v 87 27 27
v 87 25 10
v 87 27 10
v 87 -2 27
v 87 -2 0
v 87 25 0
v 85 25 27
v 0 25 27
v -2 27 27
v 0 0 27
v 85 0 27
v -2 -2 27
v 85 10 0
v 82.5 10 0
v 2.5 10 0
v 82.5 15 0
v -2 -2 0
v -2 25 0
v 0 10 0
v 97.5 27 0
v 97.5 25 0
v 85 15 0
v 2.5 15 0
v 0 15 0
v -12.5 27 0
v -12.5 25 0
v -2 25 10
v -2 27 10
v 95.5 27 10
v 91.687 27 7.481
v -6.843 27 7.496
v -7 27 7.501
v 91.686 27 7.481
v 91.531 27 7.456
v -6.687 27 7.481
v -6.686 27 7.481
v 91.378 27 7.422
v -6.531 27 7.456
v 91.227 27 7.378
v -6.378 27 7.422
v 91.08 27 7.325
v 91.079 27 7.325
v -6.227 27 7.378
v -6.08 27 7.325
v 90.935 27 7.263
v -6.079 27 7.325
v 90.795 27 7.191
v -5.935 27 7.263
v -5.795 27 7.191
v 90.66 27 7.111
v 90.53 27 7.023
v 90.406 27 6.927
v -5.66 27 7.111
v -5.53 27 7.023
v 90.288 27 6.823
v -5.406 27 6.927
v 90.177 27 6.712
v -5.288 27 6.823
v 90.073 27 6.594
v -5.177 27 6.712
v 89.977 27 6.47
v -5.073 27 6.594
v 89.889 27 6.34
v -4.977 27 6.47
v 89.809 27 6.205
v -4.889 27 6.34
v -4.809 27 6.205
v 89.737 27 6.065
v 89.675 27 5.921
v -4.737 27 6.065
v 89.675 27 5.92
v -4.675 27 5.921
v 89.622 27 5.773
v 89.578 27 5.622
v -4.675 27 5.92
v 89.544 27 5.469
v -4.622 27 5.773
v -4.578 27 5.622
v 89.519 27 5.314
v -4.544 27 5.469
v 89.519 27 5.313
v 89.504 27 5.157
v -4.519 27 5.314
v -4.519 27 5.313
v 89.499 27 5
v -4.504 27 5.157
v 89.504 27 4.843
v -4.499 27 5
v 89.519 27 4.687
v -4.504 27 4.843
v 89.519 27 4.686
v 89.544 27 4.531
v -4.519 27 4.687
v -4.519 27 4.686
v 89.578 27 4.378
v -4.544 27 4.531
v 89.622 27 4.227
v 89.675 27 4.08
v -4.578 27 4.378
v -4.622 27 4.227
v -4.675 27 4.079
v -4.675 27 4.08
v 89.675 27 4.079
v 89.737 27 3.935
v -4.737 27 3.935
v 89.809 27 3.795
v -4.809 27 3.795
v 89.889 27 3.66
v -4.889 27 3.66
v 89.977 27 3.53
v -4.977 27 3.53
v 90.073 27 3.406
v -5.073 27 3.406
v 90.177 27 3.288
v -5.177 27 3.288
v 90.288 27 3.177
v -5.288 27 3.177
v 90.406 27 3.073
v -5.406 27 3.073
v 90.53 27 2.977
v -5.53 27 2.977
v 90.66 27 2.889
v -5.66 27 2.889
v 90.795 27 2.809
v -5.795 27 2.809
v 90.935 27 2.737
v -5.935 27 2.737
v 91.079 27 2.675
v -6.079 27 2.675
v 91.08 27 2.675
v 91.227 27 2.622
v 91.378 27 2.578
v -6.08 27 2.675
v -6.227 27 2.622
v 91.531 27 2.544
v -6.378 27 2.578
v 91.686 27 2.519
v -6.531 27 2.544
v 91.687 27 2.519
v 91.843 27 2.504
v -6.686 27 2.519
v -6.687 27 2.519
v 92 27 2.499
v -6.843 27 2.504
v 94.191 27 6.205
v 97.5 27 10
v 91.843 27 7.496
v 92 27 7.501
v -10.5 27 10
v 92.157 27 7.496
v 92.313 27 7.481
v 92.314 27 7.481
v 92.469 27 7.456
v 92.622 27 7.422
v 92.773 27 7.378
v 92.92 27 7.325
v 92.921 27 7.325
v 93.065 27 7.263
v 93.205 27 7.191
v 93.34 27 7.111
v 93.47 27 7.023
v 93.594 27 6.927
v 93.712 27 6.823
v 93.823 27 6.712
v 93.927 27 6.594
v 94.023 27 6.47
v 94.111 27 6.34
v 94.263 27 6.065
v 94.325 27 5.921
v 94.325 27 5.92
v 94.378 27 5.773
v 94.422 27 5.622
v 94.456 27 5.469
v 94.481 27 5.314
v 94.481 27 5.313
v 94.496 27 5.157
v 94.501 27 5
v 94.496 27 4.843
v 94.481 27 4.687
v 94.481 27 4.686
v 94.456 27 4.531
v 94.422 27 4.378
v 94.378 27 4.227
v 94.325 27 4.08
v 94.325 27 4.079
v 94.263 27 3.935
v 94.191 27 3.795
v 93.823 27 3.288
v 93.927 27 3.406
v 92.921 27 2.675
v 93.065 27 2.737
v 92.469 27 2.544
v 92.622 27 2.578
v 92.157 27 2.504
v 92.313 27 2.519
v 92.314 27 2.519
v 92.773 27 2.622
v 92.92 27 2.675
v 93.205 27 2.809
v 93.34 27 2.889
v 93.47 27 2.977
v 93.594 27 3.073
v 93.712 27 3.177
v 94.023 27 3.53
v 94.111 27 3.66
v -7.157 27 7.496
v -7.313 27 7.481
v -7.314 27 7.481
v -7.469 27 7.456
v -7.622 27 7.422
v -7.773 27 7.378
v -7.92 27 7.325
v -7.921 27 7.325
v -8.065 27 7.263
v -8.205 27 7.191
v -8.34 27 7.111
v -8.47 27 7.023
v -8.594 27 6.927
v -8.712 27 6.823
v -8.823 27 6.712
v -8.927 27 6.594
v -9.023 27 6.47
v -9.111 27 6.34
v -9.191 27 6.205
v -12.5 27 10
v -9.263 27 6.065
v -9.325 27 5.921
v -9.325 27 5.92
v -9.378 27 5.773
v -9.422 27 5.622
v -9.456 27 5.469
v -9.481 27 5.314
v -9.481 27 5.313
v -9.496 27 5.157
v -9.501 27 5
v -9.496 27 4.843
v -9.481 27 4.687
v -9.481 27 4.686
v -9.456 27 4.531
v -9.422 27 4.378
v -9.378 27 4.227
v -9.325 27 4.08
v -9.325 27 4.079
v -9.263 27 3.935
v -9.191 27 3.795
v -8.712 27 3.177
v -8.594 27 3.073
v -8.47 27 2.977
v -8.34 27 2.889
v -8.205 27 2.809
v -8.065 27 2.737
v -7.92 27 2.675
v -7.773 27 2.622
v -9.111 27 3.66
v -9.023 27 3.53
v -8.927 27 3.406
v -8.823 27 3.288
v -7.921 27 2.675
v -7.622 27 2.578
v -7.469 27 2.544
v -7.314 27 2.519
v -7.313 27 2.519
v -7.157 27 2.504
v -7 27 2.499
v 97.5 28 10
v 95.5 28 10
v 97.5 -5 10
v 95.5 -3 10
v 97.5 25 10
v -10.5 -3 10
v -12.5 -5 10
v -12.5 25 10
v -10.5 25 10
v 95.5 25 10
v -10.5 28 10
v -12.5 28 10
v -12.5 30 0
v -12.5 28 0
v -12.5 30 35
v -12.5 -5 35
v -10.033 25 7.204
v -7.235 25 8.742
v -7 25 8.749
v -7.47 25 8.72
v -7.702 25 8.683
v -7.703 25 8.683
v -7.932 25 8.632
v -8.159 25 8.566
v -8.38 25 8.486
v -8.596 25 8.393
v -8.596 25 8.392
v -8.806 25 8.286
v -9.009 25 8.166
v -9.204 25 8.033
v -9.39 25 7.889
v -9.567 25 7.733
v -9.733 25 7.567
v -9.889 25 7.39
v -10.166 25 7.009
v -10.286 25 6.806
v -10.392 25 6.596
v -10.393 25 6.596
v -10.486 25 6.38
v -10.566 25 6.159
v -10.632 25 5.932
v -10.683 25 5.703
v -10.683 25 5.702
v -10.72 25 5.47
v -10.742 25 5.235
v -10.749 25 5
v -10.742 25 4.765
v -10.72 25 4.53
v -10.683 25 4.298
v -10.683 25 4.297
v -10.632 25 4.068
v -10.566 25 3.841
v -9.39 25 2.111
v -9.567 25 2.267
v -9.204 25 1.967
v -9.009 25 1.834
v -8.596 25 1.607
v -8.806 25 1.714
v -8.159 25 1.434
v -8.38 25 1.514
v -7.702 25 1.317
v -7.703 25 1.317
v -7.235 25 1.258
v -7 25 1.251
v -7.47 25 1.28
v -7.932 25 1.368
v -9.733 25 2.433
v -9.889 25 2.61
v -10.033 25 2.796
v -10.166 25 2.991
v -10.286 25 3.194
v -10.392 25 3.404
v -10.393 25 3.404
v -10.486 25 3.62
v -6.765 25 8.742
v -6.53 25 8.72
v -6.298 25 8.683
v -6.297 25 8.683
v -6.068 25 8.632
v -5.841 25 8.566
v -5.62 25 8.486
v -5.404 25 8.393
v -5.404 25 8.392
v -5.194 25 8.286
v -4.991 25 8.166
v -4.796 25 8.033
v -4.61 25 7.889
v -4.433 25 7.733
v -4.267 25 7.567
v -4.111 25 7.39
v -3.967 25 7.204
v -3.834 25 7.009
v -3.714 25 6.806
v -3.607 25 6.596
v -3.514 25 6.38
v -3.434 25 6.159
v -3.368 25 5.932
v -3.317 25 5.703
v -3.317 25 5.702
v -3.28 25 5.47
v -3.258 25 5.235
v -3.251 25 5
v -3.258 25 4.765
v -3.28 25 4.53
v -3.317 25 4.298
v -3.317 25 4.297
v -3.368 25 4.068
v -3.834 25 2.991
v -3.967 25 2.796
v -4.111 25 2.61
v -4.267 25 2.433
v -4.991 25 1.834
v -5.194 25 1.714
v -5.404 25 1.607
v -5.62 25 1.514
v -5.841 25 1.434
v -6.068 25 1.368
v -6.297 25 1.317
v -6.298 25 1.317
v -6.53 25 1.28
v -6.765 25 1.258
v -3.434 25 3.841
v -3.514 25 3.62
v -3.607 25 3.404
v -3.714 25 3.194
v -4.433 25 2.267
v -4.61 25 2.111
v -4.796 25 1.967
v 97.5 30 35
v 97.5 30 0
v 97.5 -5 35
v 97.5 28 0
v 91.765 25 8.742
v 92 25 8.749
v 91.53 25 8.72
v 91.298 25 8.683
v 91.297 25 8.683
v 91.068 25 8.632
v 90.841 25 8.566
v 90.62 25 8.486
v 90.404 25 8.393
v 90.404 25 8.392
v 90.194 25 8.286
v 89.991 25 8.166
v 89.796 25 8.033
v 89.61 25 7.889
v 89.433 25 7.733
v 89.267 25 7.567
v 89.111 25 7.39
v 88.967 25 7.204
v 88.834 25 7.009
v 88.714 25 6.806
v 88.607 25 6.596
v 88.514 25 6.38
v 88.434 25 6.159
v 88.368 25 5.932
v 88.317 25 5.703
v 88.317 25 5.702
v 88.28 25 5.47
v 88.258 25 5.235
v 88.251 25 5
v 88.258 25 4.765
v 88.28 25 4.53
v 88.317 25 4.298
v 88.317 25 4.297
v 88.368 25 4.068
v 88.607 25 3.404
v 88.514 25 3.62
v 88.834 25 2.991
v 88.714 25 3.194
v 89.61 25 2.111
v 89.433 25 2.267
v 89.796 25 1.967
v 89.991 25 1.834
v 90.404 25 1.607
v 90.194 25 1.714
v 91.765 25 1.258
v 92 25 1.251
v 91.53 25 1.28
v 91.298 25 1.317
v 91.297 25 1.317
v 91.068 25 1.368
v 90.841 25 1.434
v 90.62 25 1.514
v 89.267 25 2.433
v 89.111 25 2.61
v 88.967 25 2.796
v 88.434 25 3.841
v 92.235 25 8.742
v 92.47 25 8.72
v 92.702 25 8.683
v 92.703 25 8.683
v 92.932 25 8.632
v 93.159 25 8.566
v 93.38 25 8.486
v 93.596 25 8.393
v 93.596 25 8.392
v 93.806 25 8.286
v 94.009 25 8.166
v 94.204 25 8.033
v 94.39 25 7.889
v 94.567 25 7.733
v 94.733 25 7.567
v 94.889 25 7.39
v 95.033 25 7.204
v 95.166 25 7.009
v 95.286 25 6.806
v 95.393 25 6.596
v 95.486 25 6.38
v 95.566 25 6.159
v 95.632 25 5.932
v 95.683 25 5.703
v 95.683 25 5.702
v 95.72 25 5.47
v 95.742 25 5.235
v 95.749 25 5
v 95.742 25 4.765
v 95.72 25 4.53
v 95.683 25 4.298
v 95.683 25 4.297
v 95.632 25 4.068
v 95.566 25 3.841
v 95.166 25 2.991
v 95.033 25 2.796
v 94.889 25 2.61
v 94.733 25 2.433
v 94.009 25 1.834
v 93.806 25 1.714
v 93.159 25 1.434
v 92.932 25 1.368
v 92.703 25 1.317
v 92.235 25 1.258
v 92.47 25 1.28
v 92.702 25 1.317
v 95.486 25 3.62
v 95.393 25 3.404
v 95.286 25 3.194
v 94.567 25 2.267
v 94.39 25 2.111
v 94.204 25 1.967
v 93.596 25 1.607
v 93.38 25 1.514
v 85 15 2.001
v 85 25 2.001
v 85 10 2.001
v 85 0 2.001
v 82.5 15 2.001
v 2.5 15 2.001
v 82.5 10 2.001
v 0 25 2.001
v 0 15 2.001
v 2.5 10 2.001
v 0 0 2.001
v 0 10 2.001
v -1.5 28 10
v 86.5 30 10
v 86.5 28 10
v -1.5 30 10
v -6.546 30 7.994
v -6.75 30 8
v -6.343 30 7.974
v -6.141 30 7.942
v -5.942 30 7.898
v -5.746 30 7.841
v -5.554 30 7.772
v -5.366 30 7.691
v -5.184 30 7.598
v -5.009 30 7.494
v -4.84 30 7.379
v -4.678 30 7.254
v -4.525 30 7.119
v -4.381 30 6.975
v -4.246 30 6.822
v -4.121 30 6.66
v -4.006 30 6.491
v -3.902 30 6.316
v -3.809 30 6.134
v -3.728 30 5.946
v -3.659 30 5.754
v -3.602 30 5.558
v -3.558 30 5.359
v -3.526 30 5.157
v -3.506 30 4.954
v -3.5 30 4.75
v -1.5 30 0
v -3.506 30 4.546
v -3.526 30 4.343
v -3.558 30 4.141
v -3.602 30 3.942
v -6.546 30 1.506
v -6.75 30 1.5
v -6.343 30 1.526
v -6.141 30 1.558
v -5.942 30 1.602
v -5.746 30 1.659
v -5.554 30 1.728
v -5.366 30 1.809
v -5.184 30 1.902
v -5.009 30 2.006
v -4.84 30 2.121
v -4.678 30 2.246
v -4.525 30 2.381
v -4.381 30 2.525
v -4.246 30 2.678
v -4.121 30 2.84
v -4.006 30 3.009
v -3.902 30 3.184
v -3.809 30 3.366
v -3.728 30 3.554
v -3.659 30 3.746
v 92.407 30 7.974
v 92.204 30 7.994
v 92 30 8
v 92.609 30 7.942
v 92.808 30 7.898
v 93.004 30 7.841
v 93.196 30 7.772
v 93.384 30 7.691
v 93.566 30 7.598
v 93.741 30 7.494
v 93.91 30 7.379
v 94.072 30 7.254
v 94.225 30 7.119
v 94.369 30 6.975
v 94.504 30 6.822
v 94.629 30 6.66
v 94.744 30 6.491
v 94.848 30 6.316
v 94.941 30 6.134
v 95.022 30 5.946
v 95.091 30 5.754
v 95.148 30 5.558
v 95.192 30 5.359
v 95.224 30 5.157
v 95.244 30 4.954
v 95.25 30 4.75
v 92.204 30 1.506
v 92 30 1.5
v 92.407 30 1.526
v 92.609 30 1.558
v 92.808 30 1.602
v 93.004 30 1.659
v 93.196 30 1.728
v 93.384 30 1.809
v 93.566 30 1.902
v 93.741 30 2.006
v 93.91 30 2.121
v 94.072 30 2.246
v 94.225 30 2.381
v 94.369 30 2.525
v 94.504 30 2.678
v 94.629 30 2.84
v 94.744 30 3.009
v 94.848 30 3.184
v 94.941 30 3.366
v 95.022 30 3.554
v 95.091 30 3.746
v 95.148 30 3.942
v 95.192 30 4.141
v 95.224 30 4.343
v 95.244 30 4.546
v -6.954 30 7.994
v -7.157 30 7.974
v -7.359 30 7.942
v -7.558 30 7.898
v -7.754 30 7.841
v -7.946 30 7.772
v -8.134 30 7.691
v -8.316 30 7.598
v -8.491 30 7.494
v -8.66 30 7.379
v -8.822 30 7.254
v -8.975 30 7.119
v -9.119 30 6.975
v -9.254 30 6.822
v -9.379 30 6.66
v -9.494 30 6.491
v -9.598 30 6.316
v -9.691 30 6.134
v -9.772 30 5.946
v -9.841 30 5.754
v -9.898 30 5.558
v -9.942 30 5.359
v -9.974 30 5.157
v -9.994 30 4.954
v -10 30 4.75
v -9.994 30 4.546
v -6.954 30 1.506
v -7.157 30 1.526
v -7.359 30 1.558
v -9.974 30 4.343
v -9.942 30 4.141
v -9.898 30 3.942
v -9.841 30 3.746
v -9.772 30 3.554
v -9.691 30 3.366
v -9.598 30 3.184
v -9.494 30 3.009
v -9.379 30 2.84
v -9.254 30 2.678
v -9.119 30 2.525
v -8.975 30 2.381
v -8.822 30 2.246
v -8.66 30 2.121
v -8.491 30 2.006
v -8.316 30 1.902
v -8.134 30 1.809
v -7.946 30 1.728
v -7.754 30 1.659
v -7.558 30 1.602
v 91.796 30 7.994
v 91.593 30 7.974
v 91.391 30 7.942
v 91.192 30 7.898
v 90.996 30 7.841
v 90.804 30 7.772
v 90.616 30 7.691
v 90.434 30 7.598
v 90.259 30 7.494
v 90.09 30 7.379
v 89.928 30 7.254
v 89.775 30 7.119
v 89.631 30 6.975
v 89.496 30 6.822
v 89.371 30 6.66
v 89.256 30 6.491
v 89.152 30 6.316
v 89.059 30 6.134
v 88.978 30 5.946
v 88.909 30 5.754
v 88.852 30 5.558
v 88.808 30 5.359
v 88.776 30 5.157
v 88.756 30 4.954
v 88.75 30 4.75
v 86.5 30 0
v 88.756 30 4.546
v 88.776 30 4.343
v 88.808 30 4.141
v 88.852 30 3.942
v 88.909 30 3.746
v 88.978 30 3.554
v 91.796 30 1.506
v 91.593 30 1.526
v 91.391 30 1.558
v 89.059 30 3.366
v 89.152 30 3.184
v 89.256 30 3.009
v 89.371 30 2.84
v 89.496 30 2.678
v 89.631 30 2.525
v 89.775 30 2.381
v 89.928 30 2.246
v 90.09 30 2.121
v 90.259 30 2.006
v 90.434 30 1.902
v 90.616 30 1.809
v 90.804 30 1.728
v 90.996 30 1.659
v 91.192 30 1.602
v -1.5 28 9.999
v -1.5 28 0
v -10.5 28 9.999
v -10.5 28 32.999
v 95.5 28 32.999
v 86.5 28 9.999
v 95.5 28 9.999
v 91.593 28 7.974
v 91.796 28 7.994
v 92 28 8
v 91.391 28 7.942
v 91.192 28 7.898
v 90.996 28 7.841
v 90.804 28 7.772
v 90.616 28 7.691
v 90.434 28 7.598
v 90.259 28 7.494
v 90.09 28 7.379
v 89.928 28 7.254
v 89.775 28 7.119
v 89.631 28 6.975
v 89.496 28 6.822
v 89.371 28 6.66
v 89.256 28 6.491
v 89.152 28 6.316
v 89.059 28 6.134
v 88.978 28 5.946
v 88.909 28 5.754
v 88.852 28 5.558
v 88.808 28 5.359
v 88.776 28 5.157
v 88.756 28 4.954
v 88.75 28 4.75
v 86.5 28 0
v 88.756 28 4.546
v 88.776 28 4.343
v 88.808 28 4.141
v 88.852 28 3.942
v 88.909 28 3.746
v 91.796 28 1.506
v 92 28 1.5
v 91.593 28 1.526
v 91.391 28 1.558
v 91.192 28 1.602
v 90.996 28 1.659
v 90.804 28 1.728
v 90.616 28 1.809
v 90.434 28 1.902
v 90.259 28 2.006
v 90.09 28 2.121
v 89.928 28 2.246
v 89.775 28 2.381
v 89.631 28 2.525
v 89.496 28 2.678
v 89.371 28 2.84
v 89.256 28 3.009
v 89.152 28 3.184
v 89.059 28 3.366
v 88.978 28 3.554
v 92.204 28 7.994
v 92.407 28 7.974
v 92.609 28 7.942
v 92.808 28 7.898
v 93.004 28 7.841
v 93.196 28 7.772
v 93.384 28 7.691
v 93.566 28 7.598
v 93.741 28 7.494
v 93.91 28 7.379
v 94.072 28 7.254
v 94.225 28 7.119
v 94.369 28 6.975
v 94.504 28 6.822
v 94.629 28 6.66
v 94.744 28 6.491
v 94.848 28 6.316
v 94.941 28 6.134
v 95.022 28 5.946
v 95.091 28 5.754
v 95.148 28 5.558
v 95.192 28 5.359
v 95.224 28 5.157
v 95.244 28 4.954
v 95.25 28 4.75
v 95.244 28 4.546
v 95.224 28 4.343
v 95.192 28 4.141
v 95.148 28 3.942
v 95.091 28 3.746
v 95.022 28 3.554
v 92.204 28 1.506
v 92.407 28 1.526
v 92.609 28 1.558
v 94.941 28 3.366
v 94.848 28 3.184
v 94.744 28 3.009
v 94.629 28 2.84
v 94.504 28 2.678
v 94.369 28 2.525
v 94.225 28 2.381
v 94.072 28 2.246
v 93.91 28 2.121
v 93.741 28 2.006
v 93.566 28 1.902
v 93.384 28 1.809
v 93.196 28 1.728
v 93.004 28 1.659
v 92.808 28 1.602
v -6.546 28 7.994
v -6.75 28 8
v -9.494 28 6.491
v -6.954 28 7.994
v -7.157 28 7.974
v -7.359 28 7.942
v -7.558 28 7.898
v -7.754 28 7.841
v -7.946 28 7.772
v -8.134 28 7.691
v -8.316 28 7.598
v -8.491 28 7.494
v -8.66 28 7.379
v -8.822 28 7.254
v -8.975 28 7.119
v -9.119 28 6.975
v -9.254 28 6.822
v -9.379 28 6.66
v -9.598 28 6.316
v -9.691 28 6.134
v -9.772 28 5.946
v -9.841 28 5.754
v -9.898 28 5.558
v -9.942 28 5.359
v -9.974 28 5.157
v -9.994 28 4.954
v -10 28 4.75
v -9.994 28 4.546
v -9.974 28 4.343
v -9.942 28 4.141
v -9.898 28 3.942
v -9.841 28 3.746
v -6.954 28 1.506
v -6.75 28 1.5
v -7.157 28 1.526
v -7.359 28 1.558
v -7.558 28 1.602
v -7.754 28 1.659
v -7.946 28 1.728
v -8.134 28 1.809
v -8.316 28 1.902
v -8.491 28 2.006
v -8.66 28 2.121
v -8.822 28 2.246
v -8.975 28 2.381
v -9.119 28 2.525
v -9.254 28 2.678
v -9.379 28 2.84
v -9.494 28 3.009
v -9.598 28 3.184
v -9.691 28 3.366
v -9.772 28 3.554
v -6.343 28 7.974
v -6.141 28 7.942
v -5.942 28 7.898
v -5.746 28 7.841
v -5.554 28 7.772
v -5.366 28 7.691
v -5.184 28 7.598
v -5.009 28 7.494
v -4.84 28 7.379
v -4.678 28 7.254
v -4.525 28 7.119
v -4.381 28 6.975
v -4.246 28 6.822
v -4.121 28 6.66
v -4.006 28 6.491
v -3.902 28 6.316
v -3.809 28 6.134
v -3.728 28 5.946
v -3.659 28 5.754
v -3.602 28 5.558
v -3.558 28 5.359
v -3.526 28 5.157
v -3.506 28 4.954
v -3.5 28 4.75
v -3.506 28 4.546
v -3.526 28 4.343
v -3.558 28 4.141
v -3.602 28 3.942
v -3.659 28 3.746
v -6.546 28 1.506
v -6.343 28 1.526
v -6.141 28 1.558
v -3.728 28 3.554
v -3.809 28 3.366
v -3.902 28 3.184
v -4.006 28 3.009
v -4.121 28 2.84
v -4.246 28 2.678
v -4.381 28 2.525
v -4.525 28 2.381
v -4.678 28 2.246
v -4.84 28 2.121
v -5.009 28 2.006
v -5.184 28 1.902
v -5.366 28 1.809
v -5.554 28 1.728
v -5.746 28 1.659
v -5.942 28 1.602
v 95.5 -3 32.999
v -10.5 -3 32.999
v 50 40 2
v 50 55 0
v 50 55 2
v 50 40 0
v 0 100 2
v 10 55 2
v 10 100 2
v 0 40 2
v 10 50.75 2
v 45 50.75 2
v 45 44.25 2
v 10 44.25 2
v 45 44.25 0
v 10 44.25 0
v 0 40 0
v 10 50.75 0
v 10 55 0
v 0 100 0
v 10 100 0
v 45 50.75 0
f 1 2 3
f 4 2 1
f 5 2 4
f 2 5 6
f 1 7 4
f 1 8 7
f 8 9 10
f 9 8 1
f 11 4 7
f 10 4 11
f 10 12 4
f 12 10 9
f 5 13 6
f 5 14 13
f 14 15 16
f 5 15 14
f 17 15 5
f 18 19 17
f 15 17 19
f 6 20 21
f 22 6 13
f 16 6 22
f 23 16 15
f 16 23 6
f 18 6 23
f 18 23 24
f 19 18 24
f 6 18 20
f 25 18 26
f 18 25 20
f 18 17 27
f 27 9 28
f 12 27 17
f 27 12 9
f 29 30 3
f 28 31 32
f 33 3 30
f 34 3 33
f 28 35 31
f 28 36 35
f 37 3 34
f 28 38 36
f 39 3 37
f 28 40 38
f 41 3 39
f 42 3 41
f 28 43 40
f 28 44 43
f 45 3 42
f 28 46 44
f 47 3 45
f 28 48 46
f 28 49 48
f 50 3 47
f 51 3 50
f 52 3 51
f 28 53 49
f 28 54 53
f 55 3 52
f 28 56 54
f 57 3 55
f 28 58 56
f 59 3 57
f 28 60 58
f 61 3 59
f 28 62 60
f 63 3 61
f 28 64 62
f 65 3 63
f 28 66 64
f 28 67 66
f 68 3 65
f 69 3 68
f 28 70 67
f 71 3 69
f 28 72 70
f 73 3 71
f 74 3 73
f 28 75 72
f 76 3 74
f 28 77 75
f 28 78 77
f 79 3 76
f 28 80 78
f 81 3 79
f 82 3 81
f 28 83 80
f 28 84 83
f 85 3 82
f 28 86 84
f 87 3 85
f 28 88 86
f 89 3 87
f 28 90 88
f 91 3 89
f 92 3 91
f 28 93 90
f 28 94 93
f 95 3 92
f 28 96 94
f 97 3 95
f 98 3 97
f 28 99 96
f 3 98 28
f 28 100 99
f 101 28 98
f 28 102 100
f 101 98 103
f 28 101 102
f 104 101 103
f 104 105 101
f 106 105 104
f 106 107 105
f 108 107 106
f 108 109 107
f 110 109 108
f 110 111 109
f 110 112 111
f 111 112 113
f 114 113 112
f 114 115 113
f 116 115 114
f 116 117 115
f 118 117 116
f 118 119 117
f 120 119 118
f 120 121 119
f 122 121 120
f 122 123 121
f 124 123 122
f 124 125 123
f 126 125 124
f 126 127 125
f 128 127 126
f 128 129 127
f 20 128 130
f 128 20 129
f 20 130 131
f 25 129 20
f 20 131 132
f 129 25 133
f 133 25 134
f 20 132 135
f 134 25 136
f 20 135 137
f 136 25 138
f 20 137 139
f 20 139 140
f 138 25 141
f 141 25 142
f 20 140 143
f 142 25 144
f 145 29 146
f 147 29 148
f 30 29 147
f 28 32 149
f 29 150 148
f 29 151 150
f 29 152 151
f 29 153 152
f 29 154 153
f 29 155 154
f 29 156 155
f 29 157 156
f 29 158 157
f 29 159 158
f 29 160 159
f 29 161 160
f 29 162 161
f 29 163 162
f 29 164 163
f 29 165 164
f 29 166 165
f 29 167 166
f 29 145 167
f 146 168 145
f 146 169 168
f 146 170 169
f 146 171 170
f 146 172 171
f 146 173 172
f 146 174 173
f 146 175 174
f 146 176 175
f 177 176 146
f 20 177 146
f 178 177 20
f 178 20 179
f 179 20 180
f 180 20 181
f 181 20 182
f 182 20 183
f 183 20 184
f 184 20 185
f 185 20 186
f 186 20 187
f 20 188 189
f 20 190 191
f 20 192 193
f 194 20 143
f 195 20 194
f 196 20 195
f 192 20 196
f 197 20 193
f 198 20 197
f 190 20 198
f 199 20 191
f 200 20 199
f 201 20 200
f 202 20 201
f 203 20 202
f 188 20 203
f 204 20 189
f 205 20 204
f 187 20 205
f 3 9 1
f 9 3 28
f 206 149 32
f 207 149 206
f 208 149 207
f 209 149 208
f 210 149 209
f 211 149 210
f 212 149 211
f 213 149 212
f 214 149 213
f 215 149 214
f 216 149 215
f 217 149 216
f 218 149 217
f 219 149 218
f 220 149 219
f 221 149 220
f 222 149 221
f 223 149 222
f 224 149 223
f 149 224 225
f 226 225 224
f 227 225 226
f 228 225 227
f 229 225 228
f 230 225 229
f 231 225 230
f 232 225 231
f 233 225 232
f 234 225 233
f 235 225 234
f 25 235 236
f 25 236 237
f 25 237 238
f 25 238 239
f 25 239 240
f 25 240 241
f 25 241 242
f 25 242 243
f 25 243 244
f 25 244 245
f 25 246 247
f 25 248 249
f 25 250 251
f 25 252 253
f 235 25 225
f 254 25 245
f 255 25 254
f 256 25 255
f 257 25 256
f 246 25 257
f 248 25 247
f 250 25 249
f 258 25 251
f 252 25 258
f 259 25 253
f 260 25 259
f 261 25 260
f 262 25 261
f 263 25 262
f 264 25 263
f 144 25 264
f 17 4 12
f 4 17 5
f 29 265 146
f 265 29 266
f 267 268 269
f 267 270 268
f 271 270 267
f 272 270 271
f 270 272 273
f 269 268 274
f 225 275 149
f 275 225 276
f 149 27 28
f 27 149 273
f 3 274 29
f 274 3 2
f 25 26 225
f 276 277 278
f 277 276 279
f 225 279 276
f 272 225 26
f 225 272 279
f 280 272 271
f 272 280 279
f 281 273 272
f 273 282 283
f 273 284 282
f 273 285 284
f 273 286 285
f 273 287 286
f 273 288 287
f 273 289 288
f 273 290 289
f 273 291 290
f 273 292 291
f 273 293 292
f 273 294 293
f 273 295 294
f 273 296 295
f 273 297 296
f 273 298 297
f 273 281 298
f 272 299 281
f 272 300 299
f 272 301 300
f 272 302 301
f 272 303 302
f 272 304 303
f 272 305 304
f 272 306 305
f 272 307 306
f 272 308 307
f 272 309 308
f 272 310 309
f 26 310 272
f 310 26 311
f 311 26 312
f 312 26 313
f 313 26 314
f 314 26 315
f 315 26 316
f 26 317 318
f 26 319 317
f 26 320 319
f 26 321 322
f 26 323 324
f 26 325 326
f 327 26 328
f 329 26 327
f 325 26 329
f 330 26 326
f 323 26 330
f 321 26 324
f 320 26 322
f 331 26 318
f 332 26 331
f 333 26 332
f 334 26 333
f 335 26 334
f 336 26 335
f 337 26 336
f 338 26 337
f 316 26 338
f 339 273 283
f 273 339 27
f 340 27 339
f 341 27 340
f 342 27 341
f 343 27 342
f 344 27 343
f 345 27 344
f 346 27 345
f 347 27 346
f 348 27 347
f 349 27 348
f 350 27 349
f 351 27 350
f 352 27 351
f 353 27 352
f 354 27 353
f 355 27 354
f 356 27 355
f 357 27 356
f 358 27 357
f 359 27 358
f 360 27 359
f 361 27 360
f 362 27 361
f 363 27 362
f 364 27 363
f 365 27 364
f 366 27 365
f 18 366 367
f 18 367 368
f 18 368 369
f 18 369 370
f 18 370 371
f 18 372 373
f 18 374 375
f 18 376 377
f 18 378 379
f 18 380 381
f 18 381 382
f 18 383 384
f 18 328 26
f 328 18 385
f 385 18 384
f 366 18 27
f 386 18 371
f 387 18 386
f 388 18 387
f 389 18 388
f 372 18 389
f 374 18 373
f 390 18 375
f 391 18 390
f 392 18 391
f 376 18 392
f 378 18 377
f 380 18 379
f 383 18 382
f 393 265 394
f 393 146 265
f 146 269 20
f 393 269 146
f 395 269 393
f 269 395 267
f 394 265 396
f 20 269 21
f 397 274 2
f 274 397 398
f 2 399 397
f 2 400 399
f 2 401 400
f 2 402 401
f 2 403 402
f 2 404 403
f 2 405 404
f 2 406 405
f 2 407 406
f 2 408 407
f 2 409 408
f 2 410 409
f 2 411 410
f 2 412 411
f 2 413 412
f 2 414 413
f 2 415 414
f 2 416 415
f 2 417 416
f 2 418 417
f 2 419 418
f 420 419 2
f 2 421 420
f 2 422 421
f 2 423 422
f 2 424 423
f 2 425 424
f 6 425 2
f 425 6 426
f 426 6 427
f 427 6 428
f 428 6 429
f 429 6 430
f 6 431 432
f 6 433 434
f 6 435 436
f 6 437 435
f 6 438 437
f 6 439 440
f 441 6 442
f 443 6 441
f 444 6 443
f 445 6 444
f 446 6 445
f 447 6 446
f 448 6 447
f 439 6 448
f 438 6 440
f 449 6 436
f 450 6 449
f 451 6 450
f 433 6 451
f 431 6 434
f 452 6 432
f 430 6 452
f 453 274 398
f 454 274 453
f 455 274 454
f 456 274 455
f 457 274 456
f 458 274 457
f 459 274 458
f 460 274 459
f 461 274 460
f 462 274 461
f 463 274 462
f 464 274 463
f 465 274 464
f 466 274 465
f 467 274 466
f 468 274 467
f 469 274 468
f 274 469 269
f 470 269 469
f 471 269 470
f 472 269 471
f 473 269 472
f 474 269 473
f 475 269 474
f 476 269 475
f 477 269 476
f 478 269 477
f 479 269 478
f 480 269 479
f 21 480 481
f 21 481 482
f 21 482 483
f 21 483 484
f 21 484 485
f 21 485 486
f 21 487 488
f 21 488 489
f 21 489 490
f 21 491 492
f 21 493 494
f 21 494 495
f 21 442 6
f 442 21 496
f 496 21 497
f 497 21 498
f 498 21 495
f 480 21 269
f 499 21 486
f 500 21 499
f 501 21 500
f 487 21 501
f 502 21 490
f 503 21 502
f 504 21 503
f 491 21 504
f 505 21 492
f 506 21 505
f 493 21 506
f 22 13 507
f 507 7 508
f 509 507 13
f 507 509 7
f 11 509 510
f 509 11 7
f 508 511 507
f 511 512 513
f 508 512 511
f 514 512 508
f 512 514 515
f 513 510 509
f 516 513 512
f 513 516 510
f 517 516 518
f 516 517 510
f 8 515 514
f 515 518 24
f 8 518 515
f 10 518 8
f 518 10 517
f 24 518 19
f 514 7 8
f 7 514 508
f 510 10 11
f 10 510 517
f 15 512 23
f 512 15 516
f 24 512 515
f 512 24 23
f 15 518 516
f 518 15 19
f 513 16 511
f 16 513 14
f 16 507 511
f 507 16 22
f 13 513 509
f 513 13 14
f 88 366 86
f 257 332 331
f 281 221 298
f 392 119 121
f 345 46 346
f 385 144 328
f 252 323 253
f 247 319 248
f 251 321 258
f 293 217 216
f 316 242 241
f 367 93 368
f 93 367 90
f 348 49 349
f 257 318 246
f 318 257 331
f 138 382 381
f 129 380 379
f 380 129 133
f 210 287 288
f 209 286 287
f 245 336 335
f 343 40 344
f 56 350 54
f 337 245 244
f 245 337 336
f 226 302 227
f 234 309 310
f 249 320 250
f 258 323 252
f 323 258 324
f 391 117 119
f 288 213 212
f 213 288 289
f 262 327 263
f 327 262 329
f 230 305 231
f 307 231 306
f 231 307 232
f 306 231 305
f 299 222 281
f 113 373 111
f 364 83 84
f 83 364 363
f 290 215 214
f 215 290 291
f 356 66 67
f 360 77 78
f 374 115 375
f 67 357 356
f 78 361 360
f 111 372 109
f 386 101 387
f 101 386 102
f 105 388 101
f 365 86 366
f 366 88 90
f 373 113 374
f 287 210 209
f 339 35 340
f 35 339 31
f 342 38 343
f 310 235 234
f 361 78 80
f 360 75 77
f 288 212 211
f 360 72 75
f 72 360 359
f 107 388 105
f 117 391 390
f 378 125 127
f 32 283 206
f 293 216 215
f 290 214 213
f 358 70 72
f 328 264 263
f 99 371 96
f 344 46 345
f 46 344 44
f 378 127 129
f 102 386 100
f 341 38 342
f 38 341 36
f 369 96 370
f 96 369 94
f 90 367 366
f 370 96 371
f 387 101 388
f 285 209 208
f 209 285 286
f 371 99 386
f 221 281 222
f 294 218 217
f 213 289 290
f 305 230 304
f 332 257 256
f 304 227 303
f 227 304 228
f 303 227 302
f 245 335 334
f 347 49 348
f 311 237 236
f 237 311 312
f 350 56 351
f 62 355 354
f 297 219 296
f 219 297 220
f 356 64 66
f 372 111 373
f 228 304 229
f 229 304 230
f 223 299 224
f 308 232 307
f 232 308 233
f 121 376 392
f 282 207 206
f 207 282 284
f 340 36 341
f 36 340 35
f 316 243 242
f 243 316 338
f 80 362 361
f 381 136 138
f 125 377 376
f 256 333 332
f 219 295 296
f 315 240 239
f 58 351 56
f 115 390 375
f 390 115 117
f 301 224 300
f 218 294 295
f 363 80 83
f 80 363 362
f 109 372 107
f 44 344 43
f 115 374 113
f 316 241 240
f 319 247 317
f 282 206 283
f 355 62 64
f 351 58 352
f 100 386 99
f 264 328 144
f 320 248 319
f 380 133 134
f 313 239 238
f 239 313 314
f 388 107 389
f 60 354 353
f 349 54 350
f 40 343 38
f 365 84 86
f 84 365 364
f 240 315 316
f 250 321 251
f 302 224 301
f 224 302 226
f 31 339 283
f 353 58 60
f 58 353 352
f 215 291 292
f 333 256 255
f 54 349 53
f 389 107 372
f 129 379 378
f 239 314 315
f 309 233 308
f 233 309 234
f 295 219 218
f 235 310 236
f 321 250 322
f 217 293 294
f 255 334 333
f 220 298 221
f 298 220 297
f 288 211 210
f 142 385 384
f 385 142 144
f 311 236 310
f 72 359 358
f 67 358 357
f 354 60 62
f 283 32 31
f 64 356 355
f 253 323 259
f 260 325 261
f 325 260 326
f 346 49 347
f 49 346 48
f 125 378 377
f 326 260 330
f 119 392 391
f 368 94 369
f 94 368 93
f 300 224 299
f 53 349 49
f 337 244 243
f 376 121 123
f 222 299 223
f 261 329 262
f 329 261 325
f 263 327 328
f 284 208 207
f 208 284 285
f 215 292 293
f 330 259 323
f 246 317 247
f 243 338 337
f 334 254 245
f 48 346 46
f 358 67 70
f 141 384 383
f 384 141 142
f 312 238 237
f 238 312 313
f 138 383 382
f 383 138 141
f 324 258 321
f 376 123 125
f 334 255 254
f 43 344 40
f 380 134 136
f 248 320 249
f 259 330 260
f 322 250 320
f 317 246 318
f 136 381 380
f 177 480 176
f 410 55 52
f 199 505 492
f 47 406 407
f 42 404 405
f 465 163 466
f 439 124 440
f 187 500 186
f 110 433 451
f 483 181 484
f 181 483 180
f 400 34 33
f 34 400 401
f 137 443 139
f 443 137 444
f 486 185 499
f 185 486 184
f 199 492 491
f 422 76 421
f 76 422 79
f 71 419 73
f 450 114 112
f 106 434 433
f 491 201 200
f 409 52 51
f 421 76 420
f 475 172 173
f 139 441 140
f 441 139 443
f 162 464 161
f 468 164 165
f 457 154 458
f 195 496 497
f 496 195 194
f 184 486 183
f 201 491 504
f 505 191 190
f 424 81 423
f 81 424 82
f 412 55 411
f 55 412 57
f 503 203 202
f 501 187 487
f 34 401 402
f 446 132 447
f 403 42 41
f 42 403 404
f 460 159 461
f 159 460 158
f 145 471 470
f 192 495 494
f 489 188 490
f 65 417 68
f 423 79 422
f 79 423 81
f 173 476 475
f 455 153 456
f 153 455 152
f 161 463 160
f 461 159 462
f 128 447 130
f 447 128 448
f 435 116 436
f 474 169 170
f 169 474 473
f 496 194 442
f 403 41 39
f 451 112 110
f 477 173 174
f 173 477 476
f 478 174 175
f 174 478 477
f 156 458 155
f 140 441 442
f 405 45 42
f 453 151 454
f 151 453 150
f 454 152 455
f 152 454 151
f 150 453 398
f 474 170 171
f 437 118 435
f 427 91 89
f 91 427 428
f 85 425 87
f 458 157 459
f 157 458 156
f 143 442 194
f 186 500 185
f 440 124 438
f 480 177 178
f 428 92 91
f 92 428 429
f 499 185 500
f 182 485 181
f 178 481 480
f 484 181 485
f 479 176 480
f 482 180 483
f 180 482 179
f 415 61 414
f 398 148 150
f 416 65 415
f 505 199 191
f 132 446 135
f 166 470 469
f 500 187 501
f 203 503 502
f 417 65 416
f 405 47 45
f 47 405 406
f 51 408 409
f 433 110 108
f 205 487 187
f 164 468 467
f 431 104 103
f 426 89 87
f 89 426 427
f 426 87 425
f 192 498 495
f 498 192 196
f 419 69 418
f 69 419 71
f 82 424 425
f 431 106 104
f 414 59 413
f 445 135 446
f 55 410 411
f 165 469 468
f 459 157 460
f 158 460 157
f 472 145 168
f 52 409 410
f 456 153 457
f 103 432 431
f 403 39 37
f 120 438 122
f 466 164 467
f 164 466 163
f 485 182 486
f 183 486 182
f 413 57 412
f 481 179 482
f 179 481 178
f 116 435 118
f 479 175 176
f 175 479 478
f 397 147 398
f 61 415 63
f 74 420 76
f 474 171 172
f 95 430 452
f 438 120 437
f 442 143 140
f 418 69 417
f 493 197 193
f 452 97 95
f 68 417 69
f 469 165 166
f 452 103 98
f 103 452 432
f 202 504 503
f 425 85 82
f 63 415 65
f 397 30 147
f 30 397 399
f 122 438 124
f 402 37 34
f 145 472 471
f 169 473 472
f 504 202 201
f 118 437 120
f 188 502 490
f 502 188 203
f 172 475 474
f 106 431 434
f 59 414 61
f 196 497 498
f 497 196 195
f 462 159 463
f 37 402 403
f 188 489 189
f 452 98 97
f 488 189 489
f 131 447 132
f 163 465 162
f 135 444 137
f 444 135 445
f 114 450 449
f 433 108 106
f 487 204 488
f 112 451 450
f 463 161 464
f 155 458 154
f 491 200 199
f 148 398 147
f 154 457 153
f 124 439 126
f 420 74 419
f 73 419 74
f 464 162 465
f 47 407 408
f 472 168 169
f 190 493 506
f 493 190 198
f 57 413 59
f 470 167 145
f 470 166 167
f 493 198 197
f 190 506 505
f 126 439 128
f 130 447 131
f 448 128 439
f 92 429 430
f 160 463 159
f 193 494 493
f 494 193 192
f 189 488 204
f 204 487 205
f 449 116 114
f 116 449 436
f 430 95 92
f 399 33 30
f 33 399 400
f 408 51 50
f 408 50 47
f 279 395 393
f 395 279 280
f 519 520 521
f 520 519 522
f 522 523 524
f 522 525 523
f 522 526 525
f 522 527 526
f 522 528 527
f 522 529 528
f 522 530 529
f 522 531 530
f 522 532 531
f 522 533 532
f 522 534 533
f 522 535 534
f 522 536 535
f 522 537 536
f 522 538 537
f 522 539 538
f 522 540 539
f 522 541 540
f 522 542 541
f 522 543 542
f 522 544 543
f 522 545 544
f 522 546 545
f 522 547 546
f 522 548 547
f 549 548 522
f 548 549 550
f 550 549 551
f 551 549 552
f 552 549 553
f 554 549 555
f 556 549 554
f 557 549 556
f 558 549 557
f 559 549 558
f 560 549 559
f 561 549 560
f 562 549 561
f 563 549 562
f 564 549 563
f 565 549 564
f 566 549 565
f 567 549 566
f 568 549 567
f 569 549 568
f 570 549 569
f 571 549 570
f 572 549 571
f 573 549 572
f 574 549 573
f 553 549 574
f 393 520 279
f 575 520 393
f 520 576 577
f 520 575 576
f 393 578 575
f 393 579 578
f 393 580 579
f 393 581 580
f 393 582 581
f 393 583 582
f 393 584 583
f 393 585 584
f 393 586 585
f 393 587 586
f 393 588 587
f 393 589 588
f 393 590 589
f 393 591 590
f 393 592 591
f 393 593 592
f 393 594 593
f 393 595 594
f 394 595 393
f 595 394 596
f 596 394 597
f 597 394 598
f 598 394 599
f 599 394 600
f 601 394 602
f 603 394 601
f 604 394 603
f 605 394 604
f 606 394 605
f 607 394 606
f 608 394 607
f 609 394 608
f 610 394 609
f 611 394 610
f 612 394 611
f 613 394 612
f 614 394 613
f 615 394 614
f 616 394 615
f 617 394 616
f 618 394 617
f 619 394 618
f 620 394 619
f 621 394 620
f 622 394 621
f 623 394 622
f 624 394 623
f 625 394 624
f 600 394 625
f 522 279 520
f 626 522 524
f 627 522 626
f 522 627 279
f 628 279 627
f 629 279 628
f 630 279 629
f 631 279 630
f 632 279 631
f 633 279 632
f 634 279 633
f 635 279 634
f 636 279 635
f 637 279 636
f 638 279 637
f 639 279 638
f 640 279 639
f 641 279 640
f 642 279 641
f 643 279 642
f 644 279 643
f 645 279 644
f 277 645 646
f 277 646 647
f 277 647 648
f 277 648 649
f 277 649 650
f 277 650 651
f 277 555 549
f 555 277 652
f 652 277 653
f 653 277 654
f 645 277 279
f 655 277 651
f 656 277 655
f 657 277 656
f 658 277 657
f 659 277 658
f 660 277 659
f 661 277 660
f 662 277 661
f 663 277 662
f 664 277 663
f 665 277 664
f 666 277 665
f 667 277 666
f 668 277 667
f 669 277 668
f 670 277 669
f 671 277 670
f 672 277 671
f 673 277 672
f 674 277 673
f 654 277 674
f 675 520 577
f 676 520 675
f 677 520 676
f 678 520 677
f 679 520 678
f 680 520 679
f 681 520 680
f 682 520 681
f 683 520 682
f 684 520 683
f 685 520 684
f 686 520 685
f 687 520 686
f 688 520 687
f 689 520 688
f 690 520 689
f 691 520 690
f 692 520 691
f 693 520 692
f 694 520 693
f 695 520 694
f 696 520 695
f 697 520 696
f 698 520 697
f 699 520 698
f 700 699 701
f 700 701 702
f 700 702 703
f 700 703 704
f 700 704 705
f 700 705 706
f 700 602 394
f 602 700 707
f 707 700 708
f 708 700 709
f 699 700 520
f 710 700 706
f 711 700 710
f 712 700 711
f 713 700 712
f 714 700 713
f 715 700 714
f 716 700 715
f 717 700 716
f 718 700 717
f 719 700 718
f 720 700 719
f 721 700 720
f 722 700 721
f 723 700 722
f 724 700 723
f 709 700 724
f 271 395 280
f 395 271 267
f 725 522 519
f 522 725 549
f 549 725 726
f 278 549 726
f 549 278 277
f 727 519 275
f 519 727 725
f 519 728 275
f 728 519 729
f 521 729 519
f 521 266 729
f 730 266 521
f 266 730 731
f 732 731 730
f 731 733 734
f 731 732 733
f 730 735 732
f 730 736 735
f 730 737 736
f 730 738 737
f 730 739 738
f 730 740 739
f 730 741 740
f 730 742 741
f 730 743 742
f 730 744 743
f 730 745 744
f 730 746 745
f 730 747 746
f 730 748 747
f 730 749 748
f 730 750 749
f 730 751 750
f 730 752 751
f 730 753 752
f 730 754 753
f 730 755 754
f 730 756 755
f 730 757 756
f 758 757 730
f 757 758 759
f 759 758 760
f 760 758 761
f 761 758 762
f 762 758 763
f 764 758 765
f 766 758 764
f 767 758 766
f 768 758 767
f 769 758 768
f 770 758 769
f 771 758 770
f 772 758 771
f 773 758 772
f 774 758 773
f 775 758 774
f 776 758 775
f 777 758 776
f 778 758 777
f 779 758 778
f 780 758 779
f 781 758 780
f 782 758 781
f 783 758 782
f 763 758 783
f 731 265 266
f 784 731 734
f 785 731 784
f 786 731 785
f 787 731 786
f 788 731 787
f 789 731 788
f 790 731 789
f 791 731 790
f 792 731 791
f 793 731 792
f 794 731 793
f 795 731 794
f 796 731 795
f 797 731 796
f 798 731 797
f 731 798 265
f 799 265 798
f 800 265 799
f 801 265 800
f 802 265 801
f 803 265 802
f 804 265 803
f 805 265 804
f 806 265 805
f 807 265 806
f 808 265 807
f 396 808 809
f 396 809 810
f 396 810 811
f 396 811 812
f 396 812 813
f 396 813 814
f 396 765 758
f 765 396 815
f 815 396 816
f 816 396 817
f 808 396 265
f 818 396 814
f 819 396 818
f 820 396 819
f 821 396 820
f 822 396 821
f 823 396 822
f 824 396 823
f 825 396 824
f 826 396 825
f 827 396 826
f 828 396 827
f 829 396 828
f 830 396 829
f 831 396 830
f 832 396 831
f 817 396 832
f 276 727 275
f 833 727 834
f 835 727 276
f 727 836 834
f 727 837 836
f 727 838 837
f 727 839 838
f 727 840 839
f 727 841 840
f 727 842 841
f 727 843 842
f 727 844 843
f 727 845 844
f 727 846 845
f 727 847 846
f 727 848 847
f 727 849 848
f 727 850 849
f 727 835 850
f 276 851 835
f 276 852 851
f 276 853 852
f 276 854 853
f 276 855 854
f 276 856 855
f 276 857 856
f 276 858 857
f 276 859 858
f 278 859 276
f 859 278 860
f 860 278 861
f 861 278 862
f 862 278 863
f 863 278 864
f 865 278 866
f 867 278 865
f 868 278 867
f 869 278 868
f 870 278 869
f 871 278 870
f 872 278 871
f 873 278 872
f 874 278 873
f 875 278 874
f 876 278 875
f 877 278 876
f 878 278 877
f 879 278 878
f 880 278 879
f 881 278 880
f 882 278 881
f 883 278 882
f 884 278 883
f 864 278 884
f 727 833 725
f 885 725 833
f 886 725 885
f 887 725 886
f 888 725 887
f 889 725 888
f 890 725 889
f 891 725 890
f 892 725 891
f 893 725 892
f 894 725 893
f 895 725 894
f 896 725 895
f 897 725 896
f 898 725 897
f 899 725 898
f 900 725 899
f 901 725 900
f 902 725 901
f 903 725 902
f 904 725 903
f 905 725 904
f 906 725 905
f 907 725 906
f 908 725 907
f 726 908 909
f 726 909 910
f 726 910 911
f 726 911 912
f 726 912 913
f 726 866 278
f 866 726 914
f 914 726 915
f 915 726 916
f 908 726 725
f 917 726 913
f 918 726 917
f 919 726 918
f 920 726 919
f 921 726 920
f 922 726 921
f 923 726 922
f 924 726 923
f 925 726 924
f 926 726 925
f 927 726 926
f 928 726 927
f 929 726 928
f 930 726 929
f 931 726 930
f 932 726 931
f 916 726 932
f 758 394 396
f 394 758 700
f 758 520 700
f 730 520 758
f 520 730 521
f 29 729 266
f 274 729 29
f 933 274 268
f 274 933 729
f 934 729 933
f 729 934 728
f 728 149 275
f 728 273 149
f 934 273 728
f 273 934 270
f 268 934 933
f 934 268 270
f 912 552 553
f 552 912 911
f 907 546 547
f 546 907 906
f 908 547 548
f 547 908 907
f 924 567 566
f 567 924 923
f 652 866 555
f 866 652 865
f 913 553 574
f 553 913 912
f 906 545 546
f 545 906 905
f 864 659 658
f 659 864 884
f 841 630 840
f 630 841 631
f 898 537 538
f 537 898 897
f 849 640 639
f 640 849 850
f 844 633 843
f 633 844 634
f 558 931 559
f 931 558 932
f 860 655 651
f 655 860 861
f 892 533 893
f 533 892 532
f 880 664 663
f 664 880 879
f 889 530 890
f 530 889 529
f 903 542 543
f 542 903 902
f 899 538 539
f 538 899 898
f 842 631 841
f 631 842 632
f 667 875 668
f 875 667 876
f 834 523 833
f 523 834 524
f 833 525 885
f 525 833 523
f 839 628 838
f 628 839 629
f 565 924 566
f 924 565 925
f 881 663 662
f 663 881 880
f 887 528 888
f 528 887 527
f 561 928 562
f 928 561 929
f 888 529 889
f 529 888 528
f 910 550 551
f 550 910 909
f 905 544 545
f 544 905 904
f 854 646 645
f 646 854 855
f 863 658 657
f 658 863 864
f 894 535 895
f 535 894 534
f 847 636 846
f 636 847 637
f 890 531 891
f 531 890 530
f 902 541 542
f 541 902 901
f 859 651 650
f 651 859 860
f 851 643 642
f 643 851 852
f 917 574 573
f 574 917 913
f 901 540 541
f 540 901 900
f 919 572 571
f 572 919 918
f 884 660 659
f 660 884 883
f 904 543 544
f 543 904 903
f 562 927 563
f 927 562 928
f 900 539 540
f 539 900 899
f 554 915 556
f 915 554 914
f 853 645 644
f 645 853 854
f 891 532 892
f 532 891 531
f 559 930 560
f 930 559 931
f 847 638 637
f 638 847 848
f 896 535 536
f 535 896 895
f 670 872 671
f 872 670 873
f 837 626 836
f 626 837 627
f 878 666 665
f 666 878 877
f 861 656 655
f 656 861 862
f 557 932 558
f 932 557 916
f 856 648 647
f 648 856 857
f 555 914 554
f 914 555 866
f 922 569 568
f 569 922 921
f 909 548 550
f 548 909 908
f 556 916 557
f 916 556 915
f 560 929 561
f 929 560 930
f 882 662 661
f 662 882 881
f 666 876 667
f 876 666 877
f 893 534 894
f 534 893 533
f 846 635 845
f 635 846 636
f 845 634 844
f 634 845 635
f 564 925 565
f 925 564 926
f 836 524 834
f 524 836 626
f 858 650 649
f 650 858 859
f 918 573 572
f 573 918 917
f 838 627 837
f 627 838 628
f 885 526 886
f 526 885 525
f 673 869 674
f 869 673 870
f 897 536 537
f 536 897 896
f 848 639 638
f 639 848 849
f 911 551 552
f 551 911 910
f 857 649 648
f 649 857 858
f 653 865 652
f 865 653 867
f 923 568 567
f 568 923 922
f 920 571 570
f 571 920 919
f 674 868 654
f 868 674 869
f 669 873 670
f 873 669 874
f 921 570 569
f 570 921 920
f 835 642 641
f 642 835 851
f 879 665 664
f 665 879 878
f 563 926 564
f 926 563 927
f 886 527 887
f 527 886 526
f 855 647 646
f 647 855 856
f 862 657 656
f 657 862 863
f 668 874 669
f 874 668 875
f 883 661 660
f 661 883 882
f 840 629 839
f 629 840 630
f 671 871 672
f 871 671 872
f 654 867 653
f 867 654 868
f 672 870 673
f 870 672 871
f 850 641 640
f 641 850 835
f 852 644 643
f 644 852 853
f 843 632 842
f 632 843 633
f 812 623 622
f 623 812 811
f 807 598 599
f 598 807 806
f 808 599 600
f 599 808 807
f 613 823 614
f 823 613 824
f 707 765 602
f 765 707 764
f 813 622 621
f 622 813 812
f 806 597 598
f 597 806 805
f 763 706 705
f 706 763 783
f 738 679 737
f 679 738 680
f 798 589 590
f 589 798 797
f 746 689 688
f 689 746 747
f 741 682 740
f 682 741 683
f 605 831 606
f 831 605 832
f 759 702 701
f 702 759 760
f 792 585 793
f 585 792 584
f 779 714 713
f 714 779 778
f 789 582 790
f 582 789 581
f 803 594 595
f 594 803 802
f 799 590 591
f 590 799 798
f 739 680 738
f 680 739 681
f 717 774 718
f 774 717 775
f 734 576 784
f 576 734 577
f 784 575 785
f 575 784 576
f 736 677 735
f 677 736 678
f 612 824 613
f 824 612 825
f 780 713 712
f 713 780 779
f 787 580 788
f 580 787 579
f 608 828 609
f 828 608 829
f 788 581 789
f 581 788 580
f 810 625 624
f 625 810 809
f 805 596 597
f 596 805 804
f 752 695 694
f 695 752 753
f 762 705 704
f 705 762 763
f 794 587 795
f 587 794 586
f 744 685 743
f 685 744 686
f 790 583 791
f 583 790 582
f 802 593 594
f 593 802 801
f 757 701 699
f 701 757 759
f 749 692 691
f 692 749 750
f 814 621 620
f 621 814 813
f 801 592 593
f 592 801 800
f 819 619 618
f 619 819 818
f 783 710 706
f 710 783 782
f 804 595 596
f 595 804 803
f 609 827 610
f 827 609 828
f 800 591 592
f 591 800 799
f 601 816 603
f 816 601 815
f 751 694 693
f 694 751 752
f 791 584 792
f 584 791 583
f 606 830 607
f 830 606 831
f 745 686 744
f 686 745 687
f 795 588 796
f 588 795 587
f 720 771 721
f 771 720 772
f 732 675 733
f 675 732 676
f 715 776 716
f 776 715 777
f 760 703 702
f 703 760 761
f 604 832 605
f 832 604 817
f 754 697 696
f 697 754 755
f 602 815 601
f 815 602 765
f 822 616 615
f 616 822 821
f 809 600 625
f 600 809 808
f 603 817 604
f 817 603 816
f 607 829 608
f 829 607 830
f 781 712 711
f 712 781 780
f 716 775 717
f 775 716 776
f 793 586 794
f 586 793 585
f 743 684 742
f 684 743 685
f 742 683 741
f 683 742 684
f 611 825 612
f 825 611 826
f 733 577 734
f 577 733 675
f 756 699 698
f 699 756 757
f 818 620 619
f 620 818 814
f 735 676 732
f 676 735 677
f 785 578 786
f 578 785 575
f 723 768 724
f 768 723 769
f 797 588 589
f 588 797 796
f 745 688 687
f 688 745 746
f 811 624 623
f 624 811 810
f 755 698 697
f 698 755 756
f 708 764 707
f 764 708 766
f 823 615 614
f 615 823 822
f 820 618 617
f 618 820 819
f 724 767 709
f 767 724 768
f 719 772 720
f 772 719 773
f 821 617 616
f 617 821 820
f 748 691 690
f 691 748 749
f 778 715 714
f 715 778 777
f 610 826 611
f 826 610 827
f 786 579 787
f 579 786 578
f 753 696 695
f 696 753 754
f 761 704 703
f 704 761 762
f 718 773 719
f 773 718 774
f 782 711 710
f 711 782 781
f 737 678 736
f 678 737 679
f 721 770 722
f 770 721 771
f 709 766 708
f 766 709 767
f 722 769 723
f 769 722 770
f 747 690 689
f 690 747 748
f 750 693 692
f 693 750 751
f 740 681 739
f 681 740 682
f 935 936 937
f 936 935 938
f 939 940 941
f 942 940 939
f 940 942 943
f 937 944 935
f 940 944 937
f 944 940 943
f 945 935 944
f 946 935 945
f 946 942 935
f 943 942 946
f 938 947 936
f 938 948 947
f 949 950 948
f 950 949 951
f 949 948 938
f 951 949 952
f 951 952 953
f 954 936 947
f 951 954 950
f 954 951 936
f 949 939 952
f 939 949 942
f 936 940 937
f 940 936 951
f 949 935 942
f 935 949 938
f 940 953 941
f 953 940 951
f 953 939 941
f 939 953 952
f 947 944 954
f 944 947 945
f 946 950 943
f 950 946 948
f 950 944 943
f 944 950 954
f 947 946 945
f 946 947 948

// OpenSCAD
//
// ktBOX5
//
//


gap1 = 0.001;
gap2 = 0.002;

panel_thick = 2;

X = 85;
Y = 25;
Z = 25;

X2 = 100+(panel_thick+1)*2;
Y2 = 25+(panel_thick+1)*2;
Z2 = 20+panel_thick+1;

DX = (X2-X)/2;
DY = (Y2-Y)/2;
DZ = (Z2-Z)/2;

translate([0, 0, 0]) A();
translate([-DX, -DY, 10]) B();
translate([0, 40, 0]) C();

module A()
{
difference()
{
    union()
    {
        translate([-panel_thick, -panel_thick, 0]) cube([X+panel_thick*2, Y+panel_thick*2, Z+panel_thick]);
        translate([-12.5, Y, 0]) cube([11, panel_thick, 10]);
        translate([X+1.5, Y, 0]) cube([11, panel_thick, 10]);
    }
    translate([0, 0, panel_thick+gap1]) cube([X, Y, Z]);
    translate([0, Y/2-2.5, -2.5]) cube([2.5, 5, 10]);
    translate([X-2.5, Y/2-2.5, -2.5]) cube([2.5, 5, 10]);
    translate([-7, Y+panel_thick+gap1, 5]) rotate([90, 0, 0]) cylinder( panel_thick+gap2, d1=5, d2=7.5, $fn=100);
    translate([X+7, Y+panel_thick+gap1, 5]) rotate([90, 0, 0]) cylinder( panel_thick+gap2, d1=5, d2=7.5, $fn=100);
}
}

module B()
{
difference()
{
    union()
    {
        translate([-panel_thick, -panel_thick, 0]) cube([X2+panel_thick*2, Y2+panel_thick*2, Z2+panel_thick]);
        translate([-panel_thick, Y2, -10]) cube([11, panel_thick, 10]);
        translate([X2-11+panel_thick, Y2, -10]) cube([11, panel_thick, 10]);
    }
    translate([0, 0, -gap1]) cube([X2, Y2, Z2]);
    translate([6.5/2+0.5, Y2+panel_thick+gap2, -2-6.5/2]) rotate([90, 0, 0]) cylinder( panel_thick+gap2, d1=6.5, d2=6.5, $fn=100);
    translate([X2+panel_thick-6.5+1, Y2+panel_thick+gap2, -2-6.5/2]) rotate([90, 0, 0]) cylinder(  panel_thick+gap2, d1=6.5, d2=6.5, $fn=100);
}
}

module C()
{
difference()
{
    union()
    {
        translate([0, 0, 0]) cube([50, 15, panel_thick]);
        translate([0, 0, 0]) cube([10, 60, panel_thick]);
    }
    translate([10, (15-6.5)/2, -gap1]) cube([35, 6.5, panel_thick+gap2]);
}
}
